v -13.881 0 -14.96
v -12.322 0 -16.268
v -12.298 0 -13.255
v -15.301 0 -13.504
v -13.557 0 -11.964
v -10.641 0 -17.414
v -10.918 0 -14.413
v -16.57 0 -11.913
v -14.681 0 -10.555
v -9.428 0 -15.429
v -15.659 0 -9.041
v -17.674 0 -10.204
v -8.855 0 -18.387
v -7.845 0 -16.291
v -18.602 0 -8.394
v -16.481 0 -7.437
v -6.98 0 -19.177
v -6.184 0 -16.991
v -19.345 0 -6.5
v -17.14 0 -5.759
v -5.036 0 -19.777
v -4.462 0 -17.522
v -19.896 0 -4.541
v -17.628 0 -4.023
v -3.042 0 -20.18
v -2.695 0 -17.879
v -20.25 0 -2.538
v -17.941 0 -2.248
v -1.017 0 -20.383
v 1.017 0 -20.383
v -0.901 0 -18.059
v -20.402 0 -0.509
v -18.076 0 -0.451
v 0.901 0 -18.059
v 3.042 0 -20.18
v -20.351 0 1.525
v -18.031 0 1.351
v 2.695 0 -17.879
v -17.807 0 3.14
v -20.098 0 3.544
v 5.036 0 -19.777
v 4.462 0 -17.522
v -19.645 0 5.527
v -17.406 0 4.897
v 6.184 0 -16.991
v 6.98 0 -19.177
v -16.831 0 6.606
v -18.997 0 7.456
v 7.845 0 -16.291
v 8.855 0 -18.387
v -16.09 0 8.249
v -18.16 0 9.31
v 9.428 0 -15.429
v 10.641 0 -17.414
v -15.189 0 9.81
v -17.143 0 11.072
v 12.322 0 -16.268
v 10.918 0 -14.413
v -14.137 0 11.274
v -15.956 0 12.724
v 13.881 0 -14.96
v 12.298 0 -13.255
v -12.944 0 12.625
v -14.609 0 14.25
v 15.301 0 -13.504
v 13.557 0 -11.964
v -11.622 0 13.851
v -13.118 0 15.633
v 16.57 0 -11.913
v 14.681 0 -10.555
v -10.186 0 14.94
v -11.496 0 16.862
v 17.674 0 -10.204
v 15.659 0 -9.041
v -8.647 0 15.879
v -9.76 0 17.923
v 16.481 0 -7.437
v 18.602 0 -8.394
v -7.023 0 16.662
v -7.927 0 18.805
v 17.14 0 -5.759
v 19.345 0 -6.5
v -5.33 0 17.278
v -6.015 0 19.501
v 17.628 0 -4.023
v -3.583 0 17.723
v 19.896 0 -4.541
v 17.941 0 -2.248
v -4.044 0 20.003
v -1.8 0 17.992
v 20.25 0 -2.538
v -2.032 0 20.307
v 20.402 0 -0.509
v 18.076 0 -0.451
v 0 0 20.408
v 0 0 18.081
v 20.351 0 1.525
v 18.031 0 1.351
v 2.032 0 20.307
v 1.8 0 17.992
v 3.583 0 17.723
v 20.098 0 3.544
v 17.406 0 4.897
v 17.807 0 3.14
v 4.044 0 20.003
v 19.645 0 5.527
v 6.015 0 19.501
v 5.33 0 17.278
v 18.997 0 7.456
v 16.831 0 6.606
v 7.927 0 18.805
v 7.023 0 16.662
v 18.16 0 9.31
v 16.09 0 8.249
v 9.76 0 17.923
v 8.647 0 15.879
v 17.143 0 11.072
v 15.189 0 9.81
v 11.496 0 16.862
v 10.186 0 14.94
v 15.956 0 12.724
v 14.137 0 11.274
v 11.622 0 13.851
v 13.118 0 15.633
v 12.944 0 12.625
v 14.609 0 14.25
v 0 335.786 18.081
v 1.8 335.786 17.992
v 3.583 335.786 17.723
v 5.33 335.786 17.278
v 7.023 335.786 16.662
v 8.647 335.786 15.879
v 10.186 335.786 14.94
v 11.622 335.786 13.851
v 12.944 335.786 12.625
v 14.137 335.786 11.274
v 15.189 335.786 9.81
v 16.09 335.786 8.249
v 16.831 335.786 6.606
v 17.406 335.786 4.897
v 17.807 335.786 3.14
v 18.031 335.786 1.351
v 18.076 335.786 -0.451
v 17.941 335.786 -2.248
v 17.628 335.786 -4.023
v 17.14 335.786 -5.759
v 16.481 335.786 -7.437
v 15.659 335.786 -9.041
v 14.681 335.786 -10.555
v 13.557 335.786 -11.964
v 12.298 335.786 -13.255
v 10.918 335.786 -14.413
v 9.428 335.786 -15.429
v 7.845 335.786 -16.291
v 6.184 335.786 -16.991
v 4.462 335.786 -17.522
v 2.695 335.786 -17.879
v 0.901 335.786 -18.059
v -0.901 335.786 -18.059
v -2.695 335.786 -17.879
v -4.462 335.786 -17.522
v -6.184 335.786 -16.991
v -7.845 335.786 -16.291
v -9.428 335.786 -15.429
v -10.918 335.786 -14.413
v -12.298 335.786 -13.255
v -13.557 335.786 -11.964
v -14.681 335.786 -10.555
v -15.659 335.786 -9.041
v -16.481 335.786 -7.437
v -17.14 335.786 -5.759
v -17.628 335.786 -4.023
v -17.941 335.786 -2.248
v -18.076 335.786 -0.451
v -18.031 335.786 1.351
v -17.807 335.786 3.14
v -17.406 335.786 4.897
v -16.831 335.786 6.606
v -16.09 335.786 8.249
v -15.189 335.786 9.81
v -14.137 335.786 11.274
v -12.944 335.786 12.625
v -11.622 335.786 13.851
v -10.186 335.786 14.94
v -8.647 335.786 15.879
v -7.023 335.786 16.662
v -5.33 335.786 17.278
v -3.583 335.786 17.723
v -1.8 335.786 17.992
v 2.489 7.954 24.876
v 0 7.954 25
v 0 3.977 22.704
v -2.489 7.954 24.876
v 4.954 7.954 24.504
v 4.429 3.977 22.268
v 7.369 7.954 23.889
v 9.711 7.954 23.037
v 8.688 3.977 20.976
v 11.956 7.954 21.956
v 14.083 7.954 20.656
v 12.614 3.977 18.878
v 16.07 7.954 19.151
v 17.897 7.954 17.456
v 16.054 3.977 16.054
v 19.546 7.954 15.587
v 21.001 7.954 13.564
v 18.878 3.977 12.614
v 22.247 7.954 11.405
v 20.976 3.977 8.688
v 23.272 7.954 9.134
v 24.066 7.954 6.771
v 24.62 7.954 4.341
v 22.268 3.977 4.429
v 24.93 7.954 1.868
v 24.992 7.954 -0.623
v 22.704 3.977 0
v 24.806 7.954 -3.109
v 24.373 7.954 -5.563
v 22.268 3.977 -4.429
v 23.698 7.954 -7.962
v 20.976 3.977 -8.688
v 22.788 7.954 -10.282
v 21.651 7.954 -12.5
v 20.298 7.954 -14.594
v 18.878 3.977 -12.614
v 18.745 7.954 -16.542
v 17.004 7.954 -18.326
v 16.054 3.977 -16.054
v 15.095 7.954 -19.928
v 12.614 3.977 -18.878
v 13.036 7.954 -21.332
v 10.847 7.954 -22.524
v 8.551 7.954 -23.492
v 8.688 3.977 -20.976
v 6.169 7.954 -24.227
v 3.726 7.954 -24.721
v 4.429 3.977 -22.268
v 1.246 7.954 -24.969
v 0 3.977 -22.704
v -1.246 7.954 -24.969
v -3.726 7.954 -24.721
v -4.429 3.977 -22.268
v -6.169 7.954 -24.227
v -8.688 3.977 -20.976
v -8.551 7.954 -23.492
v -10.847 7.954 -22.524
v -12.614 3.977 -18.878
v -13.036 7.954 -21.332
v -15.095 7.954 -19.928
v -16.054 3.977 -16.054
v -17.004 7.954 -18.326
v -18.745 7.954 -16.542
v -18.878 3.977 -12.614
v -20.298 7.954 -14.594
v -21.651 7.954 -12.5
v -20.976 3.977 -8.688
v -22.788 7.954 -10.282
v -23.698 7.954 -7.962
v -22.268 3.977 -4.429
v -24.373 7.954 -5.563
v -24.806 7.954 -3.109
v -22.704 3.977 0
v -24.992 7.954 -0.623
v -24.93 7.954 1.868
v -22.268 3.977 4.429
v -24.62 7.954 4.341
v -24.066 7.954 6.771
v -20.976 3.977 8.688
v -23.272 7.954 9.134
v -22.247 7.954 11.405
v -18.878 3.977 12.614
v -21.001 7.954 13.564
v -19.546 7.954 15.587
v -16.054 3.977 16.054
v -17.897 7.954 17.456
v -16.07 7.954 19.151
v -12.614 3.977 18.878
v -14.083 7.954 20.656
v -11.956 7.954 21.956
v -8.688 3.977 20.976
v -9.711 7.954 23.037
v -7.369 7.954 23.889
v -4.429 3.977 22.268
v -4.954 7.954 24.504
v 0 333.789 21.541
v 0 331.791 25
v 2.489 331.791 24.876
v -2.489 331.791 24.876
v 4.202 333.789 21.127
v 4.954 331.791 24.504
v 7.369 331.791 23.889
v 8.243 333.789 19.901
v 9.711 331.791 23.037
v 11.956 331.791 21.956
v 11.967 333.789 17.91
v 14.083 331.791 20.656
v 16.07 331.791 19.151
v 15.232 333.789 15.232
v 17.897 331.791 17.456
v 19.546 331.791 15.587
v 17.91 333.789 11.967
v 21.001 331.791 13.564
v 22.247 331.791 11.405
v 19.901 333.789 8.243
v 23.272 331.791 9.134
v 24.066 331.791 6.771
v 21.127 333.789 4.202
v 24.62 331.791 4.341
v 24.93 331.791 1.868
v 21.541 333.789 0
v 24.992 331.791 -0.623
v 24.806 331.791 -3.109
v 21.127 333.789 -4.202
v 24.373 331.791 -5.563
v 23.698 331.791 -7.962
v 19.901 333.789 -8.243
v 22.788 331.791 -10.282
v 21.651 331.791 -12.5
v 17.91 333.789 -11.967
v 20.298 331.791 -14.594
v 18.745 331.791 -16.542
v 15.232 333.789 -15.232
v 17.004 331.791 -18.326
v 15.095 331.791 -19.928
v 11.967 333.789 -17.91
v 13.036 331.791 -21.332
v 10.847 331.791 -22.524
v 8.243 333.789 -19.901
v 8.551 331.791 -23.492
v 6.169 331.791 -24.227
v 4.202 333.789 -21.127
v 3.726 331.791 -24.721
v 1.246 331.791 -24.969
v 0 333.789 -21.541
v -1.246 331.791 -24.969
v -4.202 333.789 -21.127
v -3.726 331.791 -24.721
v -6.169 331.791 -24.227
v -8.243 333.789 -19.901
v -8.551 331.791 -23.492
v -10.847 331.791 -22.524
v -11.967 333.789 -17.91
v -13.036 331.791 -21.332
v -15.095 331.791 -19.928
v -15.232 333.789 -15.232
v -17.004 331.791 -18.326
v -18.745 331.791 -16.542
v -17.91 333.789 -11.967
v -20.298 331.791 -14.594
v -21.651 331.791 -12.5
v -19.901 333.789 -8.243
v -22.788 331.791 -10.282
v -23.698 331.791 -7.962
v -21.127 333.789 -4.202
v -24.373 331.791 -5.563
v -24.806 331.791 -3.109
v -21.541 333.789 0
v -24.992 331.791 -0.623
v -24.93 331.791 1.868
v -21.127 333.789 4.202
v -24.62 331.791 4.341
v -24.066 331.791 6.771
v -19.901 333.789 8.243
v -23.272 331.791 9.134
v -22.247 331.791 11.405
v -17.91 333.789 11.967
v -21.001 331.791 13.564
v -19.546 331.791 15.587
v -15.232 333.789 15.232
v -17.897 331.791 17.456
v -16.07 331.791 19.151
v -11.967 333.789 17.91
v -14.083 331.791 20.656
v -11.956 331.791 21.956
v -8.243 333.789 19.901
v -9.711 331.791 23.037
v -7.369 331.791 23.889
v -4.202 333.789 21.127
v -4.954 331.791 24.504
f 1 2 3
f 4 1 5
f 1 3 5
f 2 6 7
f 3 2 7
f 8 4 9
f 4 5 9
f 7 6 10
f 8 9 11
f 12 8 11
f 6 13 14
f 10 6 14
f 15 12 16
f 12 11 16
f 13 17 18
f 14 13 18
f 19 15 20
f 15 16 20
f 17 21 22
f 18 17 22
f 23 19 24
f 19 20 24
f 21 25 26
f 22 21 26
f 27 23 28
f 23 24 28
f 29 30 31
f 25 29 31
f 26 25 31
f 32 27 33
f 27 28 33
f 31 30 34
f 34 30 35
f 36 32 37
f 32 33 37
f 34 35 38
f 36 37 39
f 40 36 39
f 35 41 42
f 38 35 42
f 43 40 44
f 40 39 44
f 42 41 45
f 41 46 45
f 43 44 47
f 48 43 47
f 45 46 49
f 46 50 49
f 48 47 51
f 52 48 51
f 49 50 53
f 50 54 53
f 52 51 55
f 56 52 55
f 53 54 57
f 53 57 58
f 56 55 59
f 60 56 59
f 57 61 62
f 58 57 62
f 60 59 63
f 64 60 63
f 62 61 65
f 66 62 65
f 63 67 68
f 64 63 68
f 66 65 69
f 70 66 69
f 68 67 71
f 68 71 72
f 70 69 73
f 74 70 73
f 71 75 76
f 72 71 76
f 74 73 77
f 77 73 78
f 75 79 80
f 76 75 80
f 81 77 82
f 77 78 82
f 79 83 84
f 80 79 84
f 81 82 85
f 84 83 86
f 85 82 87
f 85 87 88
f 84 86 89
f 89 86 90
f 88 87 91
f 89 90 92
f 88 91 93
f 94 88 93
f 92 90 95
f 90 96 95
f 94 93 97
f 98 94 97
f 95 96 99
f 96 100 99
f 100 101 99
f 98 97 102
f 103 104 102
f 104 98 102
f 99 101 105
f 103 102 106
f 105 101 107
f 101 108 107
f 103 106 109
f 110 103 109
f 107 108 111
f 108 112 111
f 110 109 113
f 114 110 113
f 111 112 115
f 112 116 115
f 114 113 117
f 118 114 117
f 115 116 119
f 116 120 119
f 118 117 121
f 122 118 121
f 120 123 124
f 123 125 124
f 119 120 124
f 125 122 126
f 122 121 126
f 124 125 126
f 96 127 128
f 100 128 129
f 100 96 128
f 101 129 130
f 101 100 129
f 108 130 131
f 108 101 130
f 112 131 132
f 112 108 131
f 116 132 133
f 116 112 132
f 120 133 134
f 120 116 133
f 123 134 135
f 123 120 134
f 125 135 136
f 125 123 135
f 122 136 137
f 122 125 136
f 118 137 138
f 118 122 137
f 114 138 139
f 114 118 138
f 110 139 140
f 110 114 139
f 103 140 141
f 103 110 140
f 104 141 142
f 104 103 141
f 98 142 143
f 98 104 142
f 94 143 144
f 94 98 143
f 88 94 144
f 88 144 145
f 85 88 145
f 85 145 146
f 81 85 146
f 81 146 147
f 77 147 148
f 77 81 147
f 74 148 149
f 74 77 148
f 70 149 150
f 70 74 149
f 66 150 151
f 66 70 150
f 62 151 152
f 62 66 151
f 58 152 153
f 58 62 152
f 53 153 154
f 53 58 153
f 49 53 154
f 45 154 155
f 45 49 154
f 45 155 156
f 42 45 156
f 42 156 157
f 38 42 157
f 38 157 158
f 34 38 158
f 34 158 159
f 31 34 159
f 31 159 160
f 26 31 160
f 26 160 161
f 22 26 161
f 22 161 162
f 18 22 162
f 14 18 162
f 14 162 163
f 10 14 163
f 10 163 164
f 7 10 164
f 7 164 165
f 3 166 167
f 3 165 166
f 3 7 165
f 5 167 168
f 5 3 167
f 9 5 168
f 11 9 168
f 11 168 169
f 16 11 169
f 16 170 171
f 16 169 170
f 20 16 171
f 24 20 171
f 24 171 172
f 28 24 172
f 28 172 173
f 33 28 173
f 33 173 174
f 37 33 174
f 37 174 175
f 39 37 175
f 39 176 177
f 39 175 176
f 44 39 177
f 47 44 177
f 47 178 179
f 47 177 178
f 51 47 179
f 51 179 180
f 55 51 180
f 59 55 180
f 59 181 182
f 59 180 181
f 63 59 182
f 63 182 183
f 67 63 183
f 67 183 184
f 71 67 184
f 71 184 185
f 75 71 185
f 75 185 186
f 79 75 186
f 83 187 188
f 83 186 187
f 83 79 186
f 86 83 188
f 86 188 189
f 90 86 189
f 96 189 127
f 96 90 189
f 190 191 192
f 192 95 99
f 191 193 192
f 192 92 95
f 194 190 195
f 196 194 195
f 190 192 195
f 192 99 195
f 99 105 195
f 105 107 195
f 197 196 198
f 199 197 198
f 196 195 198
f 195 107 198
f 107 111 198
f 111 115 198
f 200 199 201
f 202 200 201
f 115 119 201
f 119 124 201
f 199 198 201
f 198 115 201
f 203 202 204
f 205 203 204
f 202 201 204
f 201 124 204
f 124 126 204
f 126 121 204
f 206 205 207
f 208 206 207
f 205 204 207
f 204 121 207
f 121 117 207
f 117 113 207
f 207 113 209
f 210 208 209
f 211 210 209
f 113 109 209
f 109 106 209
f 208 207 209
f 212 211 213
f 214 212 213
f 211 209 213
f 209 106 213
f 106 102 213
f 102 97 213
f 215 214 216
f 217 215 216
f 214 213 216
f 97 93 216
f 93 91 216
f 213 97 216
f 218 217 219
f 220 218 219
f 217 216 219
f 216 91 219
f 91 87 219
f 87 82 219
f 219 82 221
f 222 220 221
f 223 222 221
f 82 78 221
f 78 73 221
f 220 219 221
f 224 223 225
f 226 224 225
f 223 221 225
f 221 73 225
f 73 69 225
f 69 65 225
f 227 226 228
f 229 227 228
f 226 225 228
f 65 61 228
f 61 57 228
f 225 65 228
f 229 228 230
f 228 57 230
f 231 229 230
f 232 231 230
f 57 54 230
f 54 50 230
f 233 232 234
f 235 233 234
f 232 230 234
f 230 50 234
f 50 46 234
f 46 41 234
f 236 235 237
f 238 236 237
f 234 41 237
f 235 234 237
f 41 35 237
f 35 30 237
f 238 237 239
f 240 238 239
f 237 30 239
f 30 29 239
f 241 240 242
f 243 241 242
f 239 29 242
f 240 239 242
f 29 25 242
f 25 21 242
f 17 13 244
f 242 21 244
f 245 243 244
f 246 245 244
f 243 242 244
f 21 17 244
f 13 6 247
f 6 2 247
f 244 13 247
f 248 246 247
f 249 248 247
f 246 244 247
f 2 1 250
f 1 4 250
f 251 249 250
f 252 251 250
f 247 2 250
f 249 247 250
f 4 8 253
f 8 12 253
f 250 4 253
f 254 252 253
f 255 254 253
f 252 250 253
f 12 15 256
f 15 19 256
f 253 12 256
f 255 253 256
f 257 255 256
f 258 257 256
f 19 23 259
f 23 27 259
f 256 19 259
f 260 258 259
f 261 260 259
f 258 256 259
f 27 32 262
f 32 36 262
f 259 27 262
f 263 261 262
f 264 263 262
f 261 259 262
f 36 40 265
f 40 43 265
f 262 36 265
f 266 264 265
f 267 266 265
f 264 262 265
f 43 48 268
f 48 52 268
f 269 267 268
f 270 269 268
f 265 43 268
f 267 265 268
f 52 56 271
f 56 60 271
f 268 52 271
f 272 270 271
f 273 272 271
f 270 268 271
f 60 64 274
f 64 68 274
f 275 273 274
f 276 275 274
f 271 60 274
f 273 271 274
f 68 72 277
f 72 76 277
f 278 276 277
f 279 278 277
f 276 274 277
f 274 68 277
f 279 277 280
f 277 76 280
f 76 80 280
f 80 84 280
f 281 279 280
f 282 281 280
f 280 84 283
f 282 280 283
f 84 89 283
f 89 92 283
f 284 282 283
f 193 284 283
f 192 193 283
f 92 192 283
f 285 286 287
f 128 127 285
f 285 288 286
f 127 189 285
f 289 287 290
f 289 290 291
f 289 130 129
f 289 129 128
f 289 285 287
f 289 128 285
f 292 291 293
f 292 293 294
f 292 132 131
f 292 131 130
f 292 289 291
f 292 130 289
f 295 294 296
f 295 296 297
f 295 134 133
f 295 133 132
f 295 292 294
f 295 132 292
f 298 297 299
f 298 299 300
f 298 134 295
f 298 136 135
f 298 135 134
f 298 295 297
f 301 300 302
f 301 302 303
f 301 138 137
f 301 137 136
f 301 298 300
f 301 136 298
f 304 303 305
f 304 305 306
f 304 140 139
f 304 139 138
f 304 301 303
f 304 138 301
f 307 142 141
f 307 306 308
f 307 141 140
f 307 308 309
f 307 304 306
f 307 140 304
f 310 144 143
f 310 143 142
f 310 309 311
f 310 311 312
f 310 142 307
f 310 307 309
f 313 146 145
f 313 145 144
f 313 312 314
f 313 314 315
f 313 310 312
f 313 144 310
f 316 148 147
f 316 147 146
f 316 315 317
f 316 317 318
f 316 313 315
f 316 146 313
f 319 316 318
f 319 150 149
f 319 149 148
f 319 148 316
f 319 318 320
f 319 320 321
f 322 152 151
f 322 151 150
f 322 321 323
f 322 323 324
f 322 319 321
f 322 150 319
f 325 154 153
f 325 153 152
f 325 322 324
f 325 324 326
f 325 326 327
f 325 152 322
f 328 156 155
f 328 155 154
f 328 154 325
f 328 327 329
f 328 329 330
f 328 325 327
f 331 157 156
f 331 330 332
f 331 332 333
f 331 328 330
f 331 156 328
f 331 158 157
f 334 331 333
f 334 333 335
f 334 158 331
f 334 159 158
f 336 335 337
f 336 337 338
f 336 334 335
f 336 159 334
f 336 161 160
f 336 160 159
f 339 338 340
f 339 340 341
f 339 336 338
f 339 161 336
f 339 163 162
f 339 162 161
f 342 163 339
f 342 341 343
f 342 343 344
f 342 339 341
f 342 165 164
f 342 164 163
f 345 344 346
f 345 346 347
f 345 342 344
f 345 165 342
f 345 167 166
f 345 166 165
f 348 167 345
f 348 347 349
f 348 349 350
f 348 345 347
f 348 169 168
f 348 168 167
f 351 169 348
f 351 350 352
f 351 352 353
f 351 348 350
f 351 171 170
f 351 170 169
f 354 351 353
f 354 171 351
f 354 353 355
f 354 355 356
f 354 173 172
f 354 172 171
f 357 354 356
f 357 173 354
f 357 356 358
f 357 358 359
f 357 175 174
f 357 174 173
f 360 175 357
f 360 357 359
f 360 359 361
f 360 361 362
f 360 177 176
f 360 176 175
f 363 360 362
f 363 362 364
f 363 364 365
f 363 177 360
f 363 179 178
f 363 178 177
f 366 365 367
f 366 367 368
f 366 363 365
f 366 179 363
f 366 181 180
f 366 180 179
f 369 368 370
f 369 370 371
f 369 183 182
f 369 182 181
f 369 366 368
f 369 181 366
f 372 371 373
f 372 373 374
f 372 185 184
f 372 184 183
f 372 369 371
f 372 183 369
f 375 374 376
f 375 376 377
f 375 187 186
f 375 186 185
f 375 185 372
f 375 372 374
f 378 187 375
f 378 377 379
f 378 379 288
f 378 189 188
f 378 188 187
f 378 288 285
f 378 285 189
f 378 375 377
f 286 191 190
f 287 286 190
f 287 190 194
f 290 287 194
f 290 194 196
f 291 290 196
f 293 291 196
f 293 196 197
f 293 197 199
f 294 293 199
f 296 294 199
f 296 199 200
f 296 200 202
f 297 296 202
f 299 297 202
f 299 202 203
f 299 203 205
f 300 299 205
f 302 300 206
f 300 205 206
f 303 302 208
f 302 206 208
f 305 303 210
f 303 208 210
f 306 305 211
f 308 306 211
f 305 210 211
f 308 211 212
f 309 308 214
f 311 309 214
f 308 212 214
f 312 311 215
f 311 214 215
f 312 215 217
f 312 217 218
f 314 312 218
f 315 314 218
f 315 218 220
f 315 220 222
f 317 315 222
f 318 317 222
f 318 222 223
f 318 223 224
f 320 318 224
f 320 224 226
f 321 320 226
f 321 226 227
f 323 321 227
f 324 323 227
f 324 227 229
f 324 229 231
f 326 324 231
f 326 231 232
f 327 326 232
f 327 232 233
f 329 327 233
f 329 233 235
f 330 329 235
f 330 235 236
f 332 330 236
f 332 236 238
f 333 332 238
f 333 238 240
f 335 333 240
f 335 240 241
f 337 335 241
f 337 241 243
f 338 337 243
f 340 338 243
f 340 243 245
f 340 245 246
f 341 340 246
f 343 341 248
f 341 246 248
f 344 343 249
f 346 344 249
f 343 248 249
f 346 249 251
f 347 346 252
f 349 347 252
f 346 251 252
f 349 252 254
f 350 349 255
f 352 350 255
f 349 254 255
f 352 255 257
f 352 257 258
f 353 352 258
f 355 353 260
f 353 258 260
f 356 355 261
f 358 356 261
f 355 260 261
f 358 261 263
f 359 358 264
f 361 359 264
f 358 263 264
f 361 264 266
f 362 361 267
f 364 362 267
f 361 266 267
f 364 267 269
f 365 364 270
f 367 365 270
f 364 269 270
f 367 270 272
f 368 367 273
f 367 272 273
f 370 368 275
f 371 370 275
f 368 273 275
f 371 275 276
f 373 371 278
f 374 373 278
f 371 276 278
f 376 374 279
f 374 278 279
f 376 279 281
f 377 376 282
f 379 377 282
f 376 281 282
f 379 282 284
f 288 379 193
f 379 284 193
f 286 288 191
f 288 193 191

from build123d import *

# Parameters (mm, degrees)
SKETCH1_R           = 25
BOSS_EXTRUDE1_DEPTH = 336.383451
SKETCH2_R           = 18.081362876
CUT_EXTRUDE1_DEPTH  = 339.236346519
CHAMFER1_SIZE       = 4.592063
CHAMFER1_SIZE_2     = 7.953686


with BuildPart() as part:
    # Sketch1 → Boss-Extrude1 (new body)
    with BuildSketch(Plane(origin=(0, 0, 0), x_dir=(1, 0, 0), z_dir=(0, 1, 0))):
        with Locations(Location((0, 0, 0), (0, 0, 270))):
            Circle(SKETCH1_R)
    extrude(amount=BOSS_EXTRUDE1_DEPTH)

    # Sketch2 → Cut-Extrude1 (cut, through all)
    with BuildSketch(Plane(origin=(0, 0, 0), x_dir=(1, 0, 0), z_dir=(0, 1, 0))):
        with Locations(Location((0, 0, 0), (0, 0, 270))):
            Circle(SKETCH2_R)
    extrude(amount=CUT_EXTRUDE1_DEPTH, mode=Mode.SUBTRACT)

    # Chamfer1
    # the kernel refuses this chamfer: 7.953686, 4.592063 mm, written as the material it takes off along each edge
    with BuildSketch(Plane(origin=(0, 336.383451, 0), x_dir=(0, 0, 1), z_dir=(-1, 0, 0))) as chamfer1_piece_1:
        Polygon((25, -CHAMFER1_SIZE), (25 - CHAMFER1_SIZE_2, 0), (25, 0), align=None)
    revolve(axis=Axis((0, 336.383451, 0), (0, 1, 0)), mode=Mode.SUBTRACT)
    with BuildSketch(Plane(origin=(0, 0, 0), x_dir=(0, 0, 1), z_dir=(-1, 0, 0))) as chamfer1_piece_2:
        Polygon((25, CHAMFER1_SIZE_2), (25 - CHAMFER1_SIZE, 0), (25, 0), align=None)
    revolve(axis=Axis((0, 0, 0), (0, 1, 0)), mode=Mode.SUBTRACT)


solid = part.part
